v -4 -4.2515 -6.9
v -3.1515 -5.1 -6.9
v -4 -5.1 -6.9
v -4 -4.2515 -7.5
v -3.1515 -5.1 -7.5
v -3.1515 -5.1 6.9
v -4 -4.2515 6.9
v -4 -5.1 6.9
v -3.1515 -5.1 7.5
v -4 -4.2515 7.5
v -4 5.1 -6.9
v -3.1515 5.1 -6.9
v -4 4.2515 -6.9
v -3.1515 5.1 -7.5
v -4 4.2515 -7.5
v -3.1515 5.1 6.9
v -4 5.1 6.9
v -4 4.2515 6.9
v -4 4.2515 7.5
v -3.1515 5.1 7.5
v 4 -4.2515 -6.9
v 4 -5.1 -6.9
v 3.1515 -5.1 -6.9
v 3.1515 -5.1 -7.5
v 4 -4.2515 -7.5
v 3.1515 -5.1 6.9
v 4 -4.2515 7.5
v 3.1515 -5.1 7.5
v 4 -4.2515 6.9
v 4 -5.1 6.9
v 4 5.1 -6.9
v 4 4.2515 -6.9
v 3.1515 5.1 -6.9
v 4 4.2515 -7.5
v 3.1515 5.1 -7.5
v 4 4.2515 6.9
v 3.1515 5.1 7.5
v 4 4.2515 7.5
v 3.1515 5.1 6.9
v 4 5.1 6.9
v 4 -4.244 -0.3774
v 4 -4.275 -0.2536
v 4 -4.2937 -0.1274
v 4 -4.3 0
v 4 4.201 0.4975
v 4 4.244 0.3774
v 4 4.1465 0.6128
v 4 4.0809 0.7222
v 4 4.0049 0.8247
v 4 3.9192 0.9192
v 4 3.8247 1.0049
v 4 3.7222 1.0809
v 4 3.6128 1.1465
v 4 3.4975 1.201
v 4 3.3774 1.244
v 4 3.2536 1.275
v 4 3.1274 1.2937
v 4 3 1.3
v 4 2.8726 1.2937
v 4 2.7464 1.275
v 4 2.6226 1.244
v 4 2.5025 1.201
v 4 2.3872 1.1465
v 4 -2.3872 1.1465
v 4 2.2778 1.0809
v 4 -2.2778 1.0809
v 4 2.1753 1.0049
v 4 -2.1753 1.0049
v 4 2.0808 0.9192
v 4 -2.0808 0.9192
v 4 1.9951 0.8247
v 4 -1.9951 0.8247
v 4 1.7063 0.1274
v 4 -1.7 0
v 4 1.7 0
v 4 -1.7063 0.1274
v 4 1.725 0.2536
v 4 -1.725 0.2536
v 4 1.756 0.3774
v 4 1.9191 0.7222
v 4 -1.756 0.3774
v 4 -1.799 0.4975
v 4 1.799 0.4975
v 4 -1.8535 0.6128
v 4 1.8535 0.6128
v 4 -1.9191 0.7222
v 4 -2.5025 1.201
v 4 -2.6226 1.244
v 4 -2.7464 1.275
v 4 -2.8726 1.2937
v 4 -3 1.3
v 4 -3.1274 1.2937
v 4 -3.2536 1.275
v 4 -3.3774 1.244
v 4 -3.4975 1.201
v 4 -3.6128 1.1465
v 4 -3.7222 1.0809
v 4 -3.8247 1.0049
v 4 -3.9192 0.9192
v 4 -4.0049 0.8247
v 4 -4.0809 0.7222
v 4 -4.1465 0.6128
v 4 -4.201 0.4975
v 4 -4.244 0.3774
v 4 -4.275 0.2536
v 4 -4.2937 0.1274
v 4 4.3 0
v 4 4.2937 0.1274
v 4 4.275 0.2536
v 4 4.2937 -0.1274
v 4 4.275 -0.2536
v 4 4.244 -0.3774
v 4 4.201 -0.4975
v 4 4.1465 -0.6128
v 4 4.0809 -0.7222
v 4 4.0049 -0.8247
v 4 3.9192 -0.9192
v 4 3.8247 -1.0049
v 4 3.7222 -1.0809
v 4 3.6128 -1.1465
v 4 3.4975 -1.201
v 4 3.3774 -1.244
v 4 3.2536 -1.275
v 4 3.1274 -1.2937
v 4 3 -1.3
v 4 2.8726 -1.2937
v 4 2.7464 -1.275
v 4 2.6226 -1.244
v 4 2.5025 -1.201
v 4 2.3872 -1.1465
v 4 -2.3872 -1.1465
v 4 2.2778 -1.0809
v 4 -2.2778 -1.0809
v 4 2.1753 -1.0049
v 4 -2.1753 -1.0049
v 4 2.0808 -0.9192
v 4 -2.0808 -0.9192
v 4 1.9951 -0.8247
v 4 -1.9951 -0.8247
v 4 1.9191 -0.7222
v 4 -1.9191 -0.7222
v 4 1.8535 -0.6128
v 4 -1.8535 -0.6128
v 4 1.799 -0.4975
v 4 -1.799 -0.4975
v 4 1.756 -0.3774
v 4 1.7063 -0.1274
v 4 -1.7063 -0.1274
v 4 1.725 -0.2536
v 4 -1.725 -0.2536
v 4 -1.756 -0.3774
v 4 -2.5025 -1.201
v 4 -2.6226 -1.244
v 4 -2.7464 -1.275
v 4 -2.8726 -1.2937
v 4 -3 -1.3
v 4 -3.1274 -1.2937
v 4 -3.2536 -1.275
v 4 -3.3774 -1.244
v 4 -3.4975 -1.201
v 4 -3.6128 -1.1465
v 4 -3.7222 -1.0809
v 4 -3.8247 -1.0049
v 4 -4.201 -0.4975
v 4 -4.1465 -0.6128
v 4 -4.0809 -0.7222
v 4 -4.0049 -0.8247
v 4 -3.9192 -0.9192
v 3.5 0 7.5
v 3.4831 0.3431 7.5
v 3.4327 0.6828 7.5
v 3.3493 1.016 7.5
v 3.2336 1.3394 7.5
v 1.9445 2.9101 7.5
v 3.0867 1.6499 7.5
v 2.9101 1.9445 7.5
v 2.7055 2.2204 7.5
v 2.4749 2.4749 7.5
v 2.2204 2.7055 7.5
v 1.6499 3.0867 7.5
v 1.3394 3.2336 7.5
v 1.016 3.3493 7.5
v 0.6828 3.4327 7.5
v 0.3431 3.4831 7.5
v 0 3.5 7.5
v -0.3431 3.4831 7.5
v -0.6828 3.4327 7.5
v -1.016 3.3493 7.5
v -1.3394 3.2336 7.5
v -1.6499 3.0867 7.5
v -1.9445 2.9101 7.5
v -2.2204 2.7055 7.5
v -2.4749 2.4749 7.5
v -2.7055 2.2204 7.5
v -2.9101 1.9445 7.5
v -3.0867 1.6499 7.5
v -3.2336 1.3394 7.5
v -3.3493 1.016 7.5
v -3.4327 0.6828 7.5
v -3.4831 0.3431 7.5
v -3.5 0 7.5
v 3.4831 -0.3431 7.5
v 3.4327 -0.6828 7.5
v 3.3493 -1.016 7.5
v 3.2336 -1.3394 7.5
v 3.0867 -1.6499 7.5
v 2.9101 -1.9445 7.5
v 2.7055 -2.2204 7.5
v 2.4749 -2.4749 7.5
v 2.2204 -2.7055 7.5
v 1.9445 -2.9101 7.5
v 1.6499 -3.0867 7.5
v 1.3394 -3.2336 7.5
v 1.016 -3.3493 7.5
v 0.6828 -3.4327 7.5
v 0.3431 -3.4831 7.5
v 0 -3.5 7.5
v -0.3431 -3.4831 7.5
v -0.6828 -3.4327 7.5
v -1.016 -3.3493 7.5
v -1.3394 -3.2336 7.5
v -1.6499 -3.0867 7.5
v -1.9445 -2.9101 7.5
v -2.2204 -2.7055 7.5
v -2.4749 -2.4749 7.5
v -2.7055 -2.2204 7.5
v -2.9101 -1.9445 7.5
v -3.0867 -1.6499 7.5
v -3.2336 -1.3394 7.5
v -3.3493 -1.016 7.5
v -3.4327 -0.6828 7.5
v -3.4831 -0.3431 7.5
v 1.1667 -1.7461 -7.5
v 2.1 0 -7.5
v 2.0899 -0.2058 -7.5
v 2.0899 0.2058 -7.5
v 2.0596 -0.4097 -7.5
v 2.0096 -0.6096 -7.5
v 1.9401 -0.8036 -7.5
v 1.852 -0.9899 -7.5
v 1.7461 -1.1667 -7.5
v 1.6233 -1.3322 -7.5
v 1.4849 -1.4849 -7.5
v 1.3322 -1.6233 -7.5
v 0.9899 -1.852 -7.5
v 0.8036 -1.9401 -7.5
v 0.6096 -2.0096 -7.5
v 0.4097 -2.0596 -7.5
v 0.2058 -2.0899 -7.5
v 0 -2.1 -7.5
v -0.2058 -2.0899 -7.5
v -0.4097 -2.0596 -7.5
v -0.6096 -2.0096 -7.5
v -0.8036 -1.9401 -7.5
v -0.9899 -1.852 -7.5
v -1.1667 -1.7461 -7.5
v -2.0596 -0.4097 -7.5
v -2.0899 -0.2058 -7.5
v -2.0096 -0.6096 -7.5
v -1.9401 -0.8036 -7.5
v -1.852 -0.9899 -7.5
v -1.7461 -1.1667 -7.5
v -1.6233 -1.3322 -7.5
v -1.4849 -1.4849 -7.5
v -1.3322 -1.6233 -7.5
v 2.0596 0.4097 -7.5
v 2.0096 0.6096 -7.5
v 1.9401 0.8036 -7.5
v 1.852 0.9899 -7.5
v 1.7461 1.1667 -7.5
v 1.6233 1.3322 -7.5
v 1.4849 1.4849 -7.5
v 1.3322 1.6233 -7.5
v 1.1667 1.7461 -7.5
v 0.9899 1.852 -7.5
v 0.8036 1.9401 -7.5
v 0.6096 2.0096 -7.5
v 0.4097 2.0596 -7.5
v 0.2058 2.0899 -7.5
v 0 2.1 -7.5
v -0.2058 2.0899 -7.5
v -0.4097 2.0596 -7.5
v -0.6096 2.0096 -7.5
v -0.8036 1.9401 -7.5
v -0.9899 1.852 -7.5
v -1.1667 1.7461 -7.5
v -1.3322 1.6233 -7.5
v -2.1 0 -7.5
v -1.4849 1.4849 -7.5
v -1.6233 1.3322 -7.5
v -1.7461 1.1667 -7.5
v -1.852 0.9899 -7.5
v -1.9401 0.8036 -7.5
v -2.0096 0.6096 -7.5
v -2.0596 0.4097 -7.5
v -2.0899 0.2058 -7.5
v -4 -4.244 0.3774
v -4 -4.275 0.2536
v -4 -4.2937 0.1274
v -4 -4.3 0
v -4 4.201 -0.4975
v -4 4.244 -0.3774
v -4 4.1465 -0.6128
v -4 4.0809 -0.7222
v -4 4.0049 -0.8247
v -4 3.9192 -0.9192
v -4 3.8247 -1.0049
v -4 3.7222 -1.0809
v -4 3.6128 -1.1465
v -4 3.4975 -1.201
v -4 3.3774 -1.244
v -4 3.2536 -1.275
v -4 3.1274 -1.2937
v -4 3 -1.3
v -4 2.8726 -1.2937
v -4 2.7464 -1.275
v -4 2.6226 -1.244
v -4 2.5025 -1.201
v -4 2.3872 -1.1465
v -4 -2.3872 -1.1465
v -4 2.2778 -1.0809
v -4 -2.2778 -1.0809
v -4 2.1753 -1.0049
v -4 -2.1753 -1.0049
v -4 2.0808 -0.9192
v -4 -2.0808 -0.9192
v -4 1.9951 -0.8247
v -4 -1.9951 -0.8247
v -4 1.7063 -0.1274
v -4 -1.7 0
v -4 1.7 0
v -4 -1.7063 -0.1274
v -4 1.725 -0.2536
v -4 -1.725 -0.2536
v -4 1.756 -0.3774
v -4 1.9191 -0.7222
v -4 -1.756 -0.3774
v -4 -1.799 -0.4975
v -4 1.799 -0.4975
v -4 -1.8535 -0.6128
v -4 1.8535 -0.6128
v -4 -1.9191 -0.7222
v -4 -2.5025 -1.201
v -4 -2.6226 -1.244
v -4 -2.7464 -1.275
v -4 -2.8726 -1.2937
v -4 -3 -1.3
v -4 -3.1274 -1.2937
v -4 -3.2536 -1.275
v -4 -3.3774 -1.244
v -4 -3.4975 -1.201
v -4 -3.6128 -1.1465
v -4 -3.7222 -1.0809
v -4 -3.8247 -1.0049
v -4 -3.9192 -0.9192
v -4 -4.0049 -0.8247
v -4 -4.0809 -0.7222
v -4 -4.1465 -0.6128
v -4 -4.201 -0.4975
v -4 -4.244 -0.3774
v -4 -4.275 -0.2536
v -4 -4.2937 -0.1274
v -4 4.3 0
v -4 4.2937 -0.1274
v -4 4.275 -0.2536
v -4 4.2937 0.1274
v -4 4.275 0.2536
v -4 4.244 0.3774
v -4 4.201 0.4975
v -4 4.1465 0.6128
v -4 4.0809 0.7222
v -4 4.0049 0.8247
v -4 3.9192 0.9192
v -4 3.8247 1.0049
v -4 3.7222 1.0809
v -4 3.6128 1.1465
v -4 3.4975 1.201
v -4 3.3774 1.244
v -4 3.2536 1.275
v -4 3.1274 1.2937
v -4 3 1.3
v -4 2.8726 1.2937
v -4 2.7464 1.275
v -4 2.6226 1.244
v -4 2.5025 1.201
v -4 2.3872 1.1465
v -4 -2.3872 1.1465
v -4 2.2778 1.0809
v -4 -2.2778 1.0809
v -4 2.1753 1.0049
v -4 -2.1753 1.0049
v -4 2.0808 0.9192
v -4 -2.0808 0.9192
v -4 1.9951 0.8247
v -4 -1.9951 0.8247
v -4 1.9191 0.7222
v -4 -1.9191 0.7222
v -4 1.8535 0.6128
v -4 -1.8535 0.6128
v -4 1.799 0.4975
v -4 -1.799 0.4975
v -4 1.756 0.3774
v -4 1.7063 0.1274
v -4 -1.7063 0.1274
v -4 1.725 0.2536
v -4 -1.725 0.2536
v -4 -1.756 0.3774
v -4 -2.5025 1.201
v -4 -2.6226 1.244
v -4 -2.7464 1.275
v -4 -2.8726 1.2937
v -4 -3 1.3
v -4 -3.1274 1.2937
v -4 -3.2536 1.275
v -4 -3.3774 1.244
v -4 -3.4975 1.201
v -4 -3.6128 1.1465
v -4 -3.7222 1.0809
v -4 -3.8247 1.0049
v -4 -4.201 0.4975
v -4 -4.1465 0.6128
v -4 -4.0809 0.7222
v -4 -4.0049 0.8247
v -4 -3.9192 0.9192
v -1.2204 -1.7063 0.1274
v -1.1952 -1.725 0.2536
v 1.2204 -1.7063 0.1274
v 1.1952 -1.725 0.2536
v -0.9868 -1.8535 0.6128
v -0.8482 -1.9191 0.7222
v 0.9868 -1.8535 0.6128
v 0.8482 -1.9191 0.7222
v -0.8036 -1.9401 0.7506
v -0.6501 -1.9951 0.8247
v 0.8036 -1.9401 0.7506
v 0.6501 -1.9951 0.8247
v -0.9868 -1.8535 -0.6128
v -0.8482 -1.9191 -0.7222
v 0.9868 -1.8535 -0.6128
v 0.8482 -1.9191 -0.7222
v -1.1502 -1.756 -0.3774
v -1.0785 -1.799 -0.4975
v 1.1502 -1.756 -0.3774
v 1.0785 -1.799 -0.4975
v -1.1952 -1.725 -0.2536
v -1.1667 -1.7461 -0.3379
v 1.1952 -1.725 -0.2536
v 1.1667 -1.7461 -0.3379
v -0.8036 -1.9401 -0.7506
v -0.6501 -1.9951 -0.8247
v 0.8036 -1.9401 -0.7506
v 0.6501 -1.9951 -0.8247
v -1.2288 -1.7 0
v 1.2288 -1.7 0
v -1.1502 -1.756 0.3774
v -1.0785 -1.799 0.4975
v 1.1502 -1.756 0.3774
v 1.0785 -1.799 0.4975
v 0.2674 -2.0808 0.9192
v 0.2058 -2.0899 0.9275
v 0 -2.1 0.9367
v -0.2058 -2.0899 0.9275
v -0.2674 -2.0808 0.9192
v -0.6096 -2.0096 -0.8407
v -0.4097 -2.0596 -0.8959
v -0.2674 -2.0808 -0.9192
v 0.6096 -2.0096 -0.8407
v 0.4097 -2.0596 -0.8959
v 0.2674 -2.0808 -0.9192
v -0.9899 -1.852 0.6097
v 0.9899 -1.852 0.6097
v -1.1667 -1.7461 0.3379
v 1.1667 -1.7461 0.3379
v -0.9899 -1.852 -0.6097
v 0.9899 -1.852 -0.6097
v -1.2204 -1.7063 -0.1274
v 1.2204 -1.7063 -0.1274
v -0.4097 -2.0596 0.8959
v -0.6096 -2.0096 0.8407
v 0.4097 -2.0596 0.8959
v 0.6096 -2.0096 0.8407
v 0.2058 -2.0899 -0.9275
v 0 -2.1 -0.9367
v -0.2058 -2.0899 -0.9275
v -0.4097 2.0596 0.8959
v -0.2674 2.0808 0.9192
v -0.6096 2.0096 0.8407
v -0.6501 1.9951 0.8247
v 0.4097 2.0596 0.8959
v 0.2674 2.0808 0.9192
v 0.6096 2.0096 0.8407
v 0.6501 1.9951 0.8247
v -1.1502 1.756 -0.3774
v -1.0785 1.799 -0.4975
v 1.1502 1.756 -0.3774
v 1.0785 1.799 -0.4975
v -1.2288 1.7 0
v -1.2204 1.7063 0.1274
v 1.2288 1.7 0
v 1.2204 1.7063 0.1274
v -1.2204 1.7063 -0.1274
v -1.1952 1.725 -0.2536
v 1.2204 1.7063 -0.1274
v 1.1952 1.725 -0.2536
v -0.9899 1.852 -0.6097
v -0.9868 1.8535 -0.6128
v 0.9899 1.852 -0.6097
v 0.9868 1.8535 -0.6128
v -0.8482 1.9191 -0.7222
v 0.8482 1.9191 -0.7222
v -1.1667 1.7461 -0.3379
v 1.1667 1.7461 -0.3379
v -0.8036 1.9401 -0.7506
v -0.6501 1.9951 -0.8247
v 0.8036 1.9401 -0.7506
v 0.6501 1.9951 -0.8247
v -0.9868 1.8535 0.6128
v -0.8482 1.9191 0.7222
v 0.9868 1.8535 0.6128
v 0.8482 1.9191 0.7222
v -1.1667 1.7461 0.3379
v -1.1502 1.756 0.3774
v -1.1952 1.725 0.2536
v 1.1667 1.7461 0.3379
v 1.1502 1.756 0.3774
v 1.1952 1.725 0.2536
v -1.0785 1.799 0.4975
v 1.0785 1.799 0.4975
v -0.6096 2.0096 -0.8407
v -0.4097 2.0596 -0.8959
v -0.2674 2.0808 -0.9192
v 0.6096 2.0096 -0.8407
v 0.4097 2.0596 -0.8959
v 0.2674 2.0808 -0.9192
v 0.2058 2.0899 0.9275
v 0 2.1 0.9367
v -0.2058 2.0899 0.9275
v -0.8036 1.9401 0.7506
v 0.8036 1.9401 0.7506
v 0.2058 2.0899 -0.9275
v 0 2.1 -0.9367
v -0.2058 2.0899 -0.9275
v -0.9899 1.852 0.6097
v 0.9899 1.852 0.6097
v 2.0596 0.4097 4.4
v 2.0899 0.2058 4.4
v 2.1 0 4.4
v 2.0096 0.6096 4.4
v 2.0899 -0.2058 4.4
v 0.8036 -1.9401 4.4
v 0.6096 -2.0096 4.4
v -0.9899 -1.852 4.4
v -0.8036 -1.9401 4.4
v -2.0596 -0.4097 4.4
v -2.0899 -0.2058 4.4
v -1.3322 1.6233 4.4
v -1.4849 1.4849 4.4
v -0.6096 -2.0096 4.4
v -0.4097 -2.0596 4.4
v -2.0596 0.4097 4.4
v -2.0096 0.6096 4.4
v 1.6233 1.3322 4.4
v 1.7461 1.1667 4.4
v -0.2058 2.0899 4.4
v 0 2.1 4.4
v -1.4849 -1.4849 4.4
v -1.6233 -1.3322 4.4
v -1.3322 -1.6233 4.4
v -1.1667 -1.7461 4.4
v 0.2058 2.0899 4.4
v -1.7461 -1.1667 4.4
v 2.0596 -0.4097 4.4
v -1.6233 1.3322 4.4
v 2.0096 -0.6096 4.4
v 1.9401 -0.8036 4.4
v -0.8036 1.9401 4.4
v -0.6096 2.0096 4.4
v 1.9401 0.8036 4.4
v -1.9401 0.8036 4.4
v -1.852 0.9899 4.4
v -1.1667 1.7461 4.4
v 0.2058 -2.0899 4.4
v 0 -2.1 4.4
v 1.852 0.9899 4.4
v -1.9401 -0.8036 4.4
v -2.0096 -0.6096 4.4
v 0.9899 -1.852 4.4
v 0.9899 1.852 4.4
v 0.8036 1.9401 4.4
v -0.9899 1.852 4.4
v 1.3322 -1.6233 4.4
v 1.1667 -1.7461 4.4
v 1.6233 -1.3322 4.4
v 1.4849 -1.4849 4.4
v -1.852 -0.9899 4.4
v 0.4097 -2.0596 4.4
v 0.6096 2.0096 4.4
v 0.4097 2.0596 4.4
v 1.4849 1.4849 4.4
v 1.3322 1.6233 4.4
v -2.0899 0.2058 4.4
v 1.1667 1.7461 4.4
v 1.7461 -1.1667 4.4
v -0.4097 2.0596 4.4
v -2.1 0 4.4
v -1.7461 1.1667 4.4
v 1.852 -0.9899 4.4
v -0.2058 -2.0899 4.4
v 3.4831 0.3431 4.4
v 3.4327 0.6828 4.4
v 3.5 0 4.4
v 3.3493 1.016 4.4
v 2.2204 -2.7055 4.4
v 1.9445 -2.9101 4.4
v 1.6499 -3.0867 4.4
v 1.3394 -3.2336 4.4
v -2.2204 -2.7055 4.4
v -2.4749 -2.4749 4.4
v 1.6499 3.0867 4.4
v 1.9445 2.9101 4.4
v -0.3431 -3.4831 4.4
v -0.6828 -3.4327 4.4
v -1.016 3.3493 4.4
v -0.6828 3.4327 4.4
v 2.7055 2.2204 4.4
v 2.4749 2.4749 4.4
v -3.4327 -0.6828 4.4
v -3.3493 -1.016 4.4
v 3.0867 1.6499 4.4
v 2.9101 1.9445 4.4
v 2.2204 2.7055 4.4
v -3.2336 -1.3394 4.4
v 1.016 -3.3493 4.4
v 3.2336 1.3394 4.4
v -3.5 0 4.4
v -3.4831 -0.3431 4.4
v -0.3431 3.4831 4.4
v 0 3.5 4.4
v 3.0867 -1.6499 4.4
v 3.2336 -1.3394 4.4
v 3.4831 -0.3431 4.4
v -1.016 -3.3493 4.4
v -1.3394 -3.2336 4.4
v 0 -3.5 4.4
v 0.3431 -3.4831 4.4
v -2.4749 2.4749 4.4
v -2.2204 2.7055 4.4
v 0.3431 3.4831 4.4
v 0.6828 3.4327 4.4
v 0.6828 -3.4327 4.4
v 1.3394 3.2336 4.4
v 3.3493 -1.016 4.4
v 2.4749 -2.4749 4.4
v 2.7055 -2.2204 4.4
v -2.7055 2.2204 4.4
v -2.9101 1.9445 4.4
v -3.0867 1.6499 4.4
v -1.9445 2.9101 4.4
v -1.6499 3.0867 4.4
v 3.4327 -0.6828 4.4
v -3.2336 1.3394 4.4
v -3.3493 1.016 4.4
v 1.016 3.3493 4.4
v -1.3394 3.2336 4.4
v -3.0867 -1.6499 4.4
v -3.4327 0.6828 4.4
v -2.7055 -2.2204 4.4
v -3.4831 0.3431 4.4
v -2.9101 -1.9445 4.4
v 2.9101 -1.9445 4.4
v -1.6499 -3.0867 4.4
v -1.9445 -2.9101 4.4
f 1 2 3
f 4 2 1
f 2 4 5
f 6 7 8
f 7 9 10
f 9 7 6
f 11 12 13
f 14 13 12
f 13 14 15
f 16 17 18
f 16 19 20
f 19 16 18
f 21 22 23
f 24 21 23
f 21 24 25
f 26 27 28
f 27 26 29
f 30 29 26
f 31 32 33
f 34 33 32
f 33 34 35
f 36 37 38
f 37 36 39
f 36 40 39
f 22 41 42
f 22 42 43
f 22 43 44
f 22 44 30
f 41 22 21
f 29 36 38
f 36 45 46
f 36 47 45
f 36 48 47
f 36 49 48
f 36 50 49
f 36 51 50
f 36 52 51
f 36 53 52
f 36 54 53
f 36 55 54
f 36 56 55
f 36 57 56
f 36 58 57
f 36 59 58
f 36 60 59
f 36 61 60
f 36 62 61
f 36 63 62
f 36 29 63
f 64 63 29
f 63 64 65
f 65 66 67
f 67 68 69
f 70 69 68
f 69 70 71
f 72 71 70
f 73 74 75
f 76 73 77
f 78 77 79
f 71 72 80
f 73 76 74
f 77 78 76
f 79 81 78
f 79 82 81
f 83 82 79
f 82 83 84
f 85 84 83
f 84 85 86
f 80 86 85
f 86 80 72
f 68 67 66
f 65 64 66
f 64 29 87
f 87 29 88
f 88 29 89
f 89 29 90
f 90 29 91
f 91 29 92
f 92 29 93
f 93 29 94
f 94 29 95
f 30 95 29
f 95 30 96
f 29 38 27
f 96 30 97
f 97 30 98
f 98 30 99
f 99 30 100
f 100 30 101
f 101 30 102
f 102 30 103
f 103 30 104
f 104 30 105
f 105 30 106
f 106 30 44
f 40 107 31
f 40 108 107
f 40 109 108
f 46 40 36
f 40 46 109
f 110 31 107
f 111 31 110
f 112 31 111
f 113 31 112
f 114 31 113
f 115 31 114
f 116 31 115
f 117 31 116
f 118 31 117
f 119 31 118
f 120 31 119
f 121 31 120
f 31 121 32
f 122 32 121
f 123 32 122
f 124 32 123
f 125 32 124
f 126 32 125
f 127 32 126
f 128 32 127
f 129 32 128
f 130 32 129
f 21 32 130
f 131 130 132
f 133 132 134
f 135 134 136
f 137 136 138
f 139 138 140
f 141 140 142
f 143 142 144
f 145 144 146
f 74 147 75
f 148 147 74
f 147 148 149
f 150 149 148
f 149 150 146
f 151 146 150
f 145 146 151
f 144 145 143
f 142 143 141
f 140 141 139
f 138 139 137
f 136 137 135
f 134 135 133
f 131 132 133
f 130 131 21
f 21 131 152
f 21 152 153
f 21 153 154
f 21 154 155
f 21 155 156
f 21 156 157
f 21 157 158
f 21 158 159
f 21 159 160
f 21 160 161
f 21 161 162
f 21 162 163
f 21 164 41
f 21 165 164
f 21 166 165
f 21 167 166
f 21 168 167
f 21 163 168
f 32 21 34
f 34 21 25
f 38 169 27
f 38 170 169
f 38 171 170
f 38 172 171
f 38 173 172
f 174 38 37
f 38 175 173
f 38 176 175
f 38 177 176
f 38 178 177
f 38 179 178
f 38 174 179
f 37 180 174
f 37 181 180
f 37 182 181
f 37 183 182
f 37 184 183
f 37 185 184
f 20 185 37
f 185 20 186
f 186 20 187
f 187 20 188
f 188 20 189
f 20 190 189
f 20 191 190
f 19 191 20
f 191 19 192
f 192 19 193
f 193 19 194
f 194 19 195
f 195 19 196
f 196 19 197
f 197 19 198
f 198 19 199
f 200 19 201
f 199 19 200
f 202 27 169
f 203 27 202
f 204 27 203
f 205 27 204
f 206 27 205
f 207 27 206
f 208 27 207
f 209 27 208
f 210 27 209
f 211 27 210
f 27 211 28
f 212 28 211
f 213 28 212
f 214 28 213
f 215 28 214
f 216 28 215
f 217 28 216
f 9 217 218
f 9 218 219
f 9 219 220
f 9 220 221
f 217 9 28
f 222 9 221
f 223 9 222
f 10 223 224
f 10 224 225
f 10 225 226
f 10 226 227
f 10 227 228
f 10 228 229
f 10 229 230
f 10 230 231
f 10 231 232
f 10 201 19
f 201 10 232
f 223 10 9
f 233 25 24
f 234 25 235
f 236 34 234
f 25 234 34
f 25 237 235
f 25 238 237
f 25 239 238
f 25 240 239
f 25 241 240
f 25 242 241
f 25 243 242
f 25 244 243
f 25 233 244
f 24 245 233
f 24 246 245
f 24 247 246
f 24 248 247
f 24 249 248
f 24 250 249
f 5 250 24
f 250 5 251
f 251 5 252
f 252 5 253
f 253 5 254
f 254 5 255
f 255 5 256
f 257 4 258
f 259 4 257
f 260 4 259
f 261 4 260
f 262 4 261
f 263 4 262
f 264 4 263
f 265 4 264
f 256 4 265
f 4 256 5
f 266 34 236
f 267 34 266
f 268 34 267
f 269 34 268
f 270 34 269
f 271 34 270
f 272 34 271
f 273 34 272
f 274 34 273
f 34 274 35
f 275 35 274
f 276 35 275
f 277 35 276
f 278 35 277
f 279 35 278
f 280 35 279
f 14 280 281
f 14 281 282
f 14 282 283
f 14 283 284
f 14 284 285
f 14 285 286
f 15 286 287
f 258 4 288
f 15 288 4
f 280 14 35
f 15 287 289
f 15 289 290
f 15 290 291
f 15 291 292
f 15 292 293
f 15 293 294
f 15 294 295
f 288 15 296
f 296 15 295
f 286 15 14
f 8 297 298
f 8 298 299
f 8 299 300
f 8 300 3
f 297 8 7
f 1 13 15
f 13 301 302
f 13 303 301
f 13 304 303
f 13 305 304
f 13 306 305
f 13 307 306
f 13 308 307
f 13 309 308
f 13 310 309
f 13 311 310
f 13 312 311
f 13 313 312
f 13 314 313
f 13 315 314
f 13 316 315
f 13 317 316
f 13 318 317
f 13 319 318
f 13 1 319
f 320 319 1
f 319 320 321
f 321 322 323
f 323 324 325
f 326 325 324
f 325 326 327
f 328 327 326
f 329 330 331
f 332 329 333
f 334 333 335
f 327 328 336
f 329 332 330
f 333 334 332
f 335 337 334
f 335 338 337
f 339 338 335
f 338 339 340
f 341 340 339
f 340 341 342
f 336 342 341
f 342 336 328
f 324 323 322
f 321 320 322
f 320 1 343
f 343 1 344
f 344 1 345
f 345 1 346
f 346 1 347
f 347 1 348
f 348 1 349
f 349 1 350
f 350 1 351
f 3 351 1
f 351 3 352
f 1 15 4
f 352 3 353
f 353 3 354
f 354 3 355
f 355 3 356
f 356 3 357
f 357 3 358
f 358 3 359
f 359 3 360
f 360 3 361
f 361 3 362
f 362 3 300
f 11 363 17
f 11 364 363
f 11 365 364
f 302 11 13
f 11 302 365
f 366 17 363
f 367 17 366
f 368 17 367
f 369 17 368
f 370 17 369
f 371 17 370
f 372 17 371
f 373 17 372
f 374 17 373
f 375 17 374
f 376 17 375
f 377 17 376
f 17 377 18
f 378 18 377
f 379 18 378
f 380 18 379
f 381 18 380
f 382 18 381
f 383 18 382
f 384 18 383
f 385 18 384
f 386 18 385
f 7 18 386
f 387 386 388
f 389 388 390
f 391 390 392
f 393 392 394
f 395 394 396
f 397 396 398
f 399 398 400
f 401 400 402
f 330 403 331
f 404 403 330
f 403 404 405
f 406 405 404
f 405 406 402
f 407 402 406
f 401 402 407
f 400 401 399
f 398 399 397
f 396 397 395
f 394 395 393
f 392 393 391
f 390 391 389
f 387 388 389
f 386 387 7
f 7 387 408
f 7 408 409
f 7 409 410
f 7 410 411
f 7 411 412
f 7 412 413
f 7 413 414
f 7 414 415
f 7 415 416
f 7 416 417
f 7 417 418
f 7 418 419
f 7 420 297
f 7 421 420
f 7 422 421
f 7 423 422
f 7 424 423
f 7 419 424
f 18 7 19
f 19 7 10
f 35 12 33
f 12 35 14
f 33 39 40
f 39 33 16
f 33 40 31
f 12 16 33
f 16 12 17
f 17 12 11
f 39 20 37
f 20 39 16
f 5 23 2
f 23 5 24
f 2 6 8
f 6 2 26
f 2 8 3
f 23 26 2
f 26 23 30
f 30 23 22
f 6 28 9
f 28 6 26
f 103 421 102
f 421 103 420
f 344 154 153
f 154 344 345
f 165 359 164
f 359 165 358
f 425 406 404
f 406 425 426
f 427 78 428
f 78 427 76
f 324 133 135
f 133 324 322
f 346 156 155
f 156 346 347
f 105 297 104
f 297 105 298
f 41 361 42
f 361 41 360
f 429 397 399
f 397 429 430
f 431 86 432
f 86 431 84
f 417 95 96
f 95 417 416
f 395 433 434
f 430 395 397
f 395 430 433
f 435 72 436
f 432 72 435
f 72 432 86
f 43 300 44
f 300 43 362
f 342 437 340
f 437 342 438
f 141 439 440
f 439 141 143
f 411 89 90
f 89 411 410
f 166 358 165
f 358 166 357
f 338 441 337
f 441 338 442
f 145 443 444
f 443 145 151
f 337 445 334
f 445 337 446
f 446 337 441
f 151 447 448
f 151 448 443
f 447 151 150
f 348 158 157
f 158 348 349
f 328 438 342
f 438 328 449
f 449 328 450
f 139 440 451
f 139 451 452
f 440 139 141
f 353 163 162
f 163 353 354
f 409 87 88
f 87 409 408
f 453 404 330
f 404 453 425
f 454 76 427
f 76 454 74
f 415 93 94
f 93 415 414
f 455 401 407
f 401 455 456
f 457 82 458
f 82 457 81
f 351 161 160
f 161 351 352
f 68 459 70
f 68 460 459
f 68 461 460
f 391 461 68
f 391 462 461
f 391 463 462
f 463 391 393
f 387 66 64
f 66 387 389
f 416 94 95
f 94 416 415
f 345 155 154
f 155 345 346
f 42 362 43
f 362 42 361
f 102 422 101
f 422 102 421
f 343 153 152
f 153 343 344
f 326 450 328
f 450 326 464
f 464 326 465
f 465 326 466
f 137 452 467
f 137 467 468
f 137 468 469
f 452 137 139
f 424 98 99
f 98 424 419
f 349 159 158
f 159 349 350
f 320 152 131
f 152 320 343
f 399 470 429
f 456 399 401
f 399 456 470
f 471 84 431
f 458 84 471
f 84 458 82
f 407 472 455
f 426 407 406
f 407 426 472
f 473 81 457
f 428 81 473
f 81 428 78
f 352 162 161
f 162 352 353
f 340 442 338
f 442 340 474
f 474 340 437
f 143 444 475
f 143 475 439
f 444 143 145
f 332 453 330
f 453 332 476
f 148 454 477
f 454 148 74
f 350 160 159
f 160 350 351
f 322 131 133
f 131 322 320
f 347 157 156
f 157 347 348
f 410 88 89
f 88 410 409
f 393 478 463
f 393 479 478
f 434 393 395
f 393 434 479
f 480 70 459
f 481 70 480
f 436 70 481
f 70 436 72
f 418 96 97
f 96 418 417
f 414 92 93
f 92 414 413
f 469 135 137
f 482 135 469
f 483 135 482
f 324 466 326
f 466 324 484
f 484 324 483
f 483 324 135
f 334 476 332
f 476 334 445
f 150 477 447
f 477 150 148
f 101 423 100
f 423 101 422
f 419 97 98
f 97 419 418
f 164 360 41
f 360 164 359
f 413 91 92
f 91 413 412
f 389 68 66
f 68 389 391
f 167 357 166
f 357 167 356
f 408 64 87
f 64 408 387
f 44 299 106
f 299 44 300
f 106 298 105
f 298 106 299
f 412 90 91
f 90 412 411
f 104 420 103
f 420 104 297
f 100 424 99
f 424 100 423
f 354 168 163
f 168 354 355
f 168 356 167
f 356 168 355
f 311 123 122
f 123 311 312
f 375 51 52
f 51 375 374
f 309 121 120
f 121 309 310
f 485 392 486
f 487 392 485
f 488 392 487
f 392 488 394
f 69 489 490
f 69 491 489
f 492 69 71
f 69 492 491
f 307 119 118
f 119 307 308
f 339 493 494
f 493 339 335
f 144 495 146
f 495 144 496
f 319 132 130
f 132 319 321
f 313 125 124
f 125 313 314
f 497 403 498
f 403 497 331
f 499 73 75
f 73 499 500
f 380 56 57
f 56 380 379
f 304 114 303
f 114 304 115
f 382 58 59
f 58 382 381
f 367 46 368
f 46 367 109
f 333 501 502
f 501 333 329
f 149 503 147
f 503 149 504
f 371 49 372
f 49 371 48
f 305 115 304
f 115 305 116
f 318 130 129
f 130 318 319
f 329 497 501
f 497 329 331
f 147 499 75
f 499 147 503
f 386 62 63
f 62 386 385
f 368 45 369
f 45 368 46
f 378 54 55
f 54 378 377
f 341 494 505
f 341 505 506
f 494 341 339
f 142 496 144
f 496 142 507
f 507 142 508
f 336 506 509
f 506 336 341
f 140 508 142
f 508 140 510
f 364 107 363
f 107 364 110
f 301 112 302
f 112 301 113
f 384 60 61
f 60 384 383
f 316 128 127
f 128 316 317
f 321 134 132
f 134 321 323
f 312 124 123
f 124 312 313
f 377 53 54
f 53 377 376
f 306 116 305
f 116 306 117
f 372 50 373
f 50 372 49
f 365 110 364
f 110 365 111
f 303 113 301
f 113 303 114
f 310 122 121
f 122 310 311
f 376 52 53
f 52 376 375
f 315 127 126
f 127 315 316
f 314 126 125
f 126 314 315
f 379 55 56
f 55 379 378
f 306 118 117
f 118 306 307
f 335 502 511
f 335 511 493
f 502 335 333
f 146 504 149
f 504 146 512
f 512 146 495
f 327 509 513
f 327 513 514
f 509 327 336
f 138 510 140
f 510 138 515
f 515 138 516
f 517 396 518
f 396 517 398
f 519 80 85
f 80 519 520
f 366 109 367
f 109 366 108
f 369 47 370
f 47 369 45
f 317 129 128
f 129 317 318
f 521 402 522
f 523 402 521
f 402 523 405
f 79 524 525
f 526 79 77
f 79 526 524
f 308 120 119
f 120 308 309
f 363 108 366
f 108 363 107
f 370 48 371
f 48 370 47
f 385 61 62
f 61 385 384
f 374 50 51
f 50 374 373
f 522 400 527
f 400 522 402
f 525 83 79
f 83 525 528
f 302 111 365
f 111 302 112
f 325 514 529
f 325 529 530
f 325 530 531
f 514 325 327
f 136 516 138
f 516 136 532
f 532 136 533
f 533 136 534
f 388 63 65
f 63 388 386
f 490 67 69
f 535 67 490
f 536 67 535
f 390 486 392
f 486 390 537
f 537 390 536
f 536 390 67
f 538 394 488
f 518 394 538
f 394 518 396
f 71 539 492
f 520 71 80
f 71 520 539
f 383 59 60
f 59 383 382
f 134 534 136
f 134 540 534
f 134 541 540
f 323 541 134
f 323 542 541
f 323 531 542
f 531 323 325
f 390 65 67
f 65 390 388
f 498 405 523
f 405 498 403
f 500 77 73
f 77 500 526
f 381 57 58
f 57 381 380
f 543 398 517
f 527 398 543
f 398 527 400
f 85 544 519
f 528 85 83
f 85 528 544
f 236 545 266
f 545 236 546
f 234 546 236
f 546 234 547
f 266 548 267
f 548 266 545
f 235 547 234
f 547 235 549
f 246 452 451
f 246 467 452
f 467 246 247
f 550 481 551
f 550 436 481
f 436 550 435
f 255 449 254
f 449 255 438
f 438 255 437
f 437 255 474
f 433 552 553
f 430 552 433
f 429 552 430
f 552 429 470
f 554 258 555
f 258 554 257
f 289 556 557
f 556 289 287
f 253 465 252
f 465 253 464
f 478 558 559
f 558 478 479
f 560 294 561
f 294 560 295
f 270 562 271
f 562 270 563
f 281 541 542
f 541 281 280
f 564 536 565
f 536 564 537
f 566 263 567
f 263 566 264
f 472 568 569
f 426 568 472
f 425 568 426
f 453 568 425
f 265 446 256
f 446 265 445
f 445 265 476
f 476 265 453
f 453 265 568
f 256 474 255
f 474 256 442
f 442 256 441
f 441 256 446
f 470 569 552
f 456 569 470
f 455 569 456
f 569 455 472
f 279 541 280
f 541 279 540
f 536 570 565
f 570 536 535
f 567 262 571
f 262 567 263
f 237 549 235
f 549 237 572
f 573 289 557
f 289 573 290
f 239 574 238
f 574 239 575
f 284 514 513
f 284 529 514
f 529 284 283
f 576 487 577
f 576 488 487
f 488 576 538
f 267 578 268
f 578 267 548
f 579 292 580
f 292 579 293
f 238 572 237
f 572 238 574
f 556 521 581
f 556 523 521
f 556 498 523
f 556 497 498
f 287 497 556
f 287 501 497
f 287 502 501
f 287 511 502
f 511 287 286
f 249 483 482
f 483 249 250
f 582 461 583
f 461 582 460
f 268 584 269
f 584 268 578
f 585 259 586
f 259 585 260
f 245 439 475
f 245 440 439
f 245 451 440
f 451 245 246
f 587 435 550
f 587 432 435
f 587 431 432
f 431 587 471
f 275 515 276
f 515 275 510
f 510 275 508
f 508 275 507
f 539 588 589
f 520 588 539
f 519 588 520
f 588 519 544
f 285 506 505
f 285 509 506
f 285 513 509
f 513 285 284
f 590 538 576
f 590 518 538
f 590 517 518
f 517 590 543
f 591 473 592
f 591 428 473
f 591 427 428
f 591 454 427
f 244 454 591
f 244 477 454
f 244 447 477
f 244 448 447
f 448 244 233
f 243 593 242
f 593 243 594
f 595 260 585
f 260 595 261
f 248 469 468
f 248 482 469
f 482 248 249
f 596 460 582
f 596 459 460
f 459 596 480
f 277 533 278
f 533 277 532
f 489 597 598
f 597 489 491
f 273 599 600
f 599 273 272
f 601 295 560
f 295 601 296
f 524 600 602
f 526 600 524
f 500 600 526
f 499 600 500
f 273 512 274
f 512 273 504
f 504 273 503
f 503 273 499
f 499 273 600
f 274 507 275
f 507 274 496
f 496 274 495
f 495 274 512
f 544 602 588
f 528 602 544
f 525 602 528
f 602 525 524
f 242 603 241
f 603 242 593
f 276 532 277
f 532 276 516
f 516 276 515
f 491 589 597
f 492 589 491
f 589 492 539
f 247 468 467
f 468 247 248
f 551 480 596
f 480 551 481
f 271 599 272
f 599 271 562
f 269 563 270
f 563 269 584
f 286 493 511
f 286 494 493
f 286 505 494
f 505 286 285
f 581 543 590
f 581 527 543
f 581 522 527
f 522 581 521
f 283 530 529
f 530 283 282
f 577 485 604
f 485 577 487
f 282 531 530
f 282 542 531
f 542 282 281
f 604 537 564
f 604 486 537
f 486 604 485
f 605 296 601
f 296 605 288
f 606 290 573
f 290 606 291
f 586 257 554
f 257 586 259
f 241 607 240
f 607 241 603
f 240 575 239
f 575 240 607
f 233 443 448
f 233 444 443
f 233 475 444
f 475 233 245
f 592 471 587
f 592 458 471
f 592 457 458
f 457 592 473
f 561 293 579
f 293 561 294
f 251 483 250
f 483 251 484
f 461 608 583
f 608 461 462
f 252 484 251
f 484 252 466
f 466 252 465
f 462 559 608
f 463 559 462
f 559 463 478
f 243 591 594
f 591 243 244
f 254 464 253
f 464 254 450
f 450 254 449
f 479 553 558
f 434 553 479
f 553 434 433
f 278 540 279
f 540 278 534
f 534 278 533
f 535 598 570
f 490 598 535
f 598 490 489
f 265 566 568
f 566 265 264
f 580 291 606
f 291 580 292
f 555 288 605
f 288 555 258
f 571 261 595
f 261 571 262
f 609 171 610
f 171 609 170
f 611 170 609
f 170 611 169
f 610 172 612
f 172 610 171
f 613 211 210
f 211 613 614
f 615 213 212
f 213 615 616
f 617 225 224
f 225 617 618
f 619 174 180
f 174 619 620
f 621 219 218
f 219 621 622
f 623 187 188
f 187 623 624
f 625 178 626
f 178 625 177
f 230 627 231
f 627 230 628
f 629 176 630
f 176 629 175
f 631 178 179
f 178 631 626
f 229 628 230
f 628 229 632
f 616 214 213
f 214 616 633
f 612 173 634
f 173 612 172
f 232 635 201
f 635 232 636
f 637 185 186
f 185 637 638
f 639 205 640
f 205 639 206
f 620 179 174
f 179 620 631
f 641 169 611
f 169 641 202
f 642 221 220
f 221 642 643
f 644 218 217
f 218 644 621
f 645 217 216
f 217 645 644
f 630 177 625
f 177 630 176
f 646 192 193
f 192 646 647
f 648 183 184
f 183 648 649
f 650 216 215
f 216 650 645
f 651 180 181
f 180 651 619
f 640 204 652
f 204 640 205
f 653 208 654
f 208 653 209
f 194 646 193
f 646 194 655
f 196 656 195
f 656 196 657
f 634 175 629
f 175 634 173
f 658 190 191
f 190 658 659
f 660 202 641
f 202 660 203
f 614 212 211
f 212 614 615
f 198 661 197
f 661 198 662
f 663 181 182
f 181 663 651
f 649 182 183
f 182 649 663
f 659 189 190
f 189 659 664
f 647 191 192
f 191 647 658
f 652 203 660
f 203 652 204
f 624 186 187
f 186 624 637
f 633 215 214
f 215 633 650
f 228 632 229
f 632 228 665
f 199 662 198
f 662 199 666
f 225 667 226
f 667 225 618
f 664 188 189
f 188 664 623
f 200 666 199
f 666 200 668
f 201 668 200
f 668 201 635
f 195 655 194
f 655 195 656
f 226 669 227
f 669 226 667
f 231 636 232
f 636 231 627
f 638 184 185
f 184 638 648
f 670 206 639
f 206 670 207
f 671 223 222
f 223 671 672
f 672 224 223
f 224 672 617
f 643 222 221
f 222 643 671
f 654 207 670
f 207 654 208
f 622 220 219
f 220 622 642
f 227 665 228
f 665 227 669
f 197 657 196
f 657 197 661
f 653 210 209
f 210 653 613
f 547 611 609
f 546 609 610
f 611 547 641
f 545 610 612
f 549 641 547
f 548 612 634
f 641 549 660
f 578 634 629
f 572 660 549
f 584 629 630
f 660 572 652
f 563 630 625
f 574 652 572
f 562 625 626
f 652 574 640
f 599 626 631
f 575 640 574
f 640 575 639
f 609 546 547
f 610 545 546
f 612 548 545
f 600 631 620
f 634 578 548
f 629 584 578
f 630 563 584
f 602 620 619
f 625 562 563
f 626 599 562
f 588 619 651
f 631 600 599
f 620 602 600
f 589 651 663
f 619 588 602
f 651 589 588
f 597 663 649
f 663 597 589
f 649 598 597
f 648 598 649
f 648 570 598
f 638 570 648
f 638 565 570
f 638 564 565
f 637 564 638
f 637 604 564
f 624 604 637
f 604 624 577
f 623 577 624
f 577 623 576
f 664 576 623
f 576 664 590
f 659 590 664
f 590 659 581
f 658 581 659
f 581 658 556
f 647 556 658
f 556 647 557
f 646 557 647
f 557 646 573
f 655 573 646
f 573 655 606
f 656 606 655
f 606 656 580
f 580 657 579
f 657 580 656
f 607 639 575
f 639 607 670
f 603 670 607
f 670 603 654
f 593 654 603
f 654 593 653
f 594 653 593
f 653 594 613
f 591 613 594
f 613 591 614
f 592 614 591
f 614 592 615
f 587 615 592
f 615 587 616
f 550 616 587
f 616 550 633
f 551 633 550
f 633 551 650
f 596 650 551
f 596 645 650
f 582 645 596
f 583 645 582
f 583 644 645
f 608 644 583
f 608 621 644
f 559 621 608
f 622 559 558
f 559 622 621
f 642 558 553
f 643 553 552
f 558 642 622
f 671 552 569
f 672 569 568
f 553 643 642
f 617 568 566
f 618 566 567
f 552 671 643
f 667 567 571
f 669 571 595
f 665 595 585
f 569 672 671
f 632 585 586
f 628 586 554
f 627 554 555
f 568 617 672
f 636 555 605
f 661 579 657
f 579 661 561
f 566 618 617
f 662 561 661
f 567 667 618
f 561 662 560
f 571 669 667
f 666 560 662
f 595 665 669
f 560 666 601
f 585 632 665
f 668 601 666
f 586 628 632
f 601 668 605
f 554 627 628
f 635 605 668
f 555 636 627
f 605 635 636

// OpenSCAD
$fn=64;

block_x = 8.0;
block_y = 10.2;
block_z = 15.0;

thread_hole_d = 4.2;
counterbore_d = 7.0;
counterbore_depth = 3.0;

mount_hole_d = 2.6;
mount_hole_spacing_y = 6.0;

edge_chamfer = 0.6;

module chamfered_block(x,y,z,c){
    difference(){
        cube([x,y,z], center=true);
        for (sx=[-1,1], sy=[-1,1], sz=[-1,1]){
            translate([sx*(x/2), sy*(y/2), sz*(z/2)])
                rotate([0,0,45])
                    cube([c*2, c*2, c*2], center=true);
        }
    }
}

module leadscrew_nut_housing(){
    difference(){
        chamfered_block(block_x, block_y, block_z, edge_chamfer);

        cylinder(d=thread_hole_d, h=block_z+2, center=true);

        translate([0,0,block_z/2 - counterbore_depth/2])
            cylinder(d=counterbore_d, h=counterbore_depth+0.2, center=true);

        for (sy=[-1,1]){
            translate([0, sy*(mount_hole_spacing_y/2), 0])
                rotate([0,90,0])
                    cylinder(d=mount_hole_d, h=block_x+2, center=true);
        }
    }
}

leadscrew_nut_housing();
